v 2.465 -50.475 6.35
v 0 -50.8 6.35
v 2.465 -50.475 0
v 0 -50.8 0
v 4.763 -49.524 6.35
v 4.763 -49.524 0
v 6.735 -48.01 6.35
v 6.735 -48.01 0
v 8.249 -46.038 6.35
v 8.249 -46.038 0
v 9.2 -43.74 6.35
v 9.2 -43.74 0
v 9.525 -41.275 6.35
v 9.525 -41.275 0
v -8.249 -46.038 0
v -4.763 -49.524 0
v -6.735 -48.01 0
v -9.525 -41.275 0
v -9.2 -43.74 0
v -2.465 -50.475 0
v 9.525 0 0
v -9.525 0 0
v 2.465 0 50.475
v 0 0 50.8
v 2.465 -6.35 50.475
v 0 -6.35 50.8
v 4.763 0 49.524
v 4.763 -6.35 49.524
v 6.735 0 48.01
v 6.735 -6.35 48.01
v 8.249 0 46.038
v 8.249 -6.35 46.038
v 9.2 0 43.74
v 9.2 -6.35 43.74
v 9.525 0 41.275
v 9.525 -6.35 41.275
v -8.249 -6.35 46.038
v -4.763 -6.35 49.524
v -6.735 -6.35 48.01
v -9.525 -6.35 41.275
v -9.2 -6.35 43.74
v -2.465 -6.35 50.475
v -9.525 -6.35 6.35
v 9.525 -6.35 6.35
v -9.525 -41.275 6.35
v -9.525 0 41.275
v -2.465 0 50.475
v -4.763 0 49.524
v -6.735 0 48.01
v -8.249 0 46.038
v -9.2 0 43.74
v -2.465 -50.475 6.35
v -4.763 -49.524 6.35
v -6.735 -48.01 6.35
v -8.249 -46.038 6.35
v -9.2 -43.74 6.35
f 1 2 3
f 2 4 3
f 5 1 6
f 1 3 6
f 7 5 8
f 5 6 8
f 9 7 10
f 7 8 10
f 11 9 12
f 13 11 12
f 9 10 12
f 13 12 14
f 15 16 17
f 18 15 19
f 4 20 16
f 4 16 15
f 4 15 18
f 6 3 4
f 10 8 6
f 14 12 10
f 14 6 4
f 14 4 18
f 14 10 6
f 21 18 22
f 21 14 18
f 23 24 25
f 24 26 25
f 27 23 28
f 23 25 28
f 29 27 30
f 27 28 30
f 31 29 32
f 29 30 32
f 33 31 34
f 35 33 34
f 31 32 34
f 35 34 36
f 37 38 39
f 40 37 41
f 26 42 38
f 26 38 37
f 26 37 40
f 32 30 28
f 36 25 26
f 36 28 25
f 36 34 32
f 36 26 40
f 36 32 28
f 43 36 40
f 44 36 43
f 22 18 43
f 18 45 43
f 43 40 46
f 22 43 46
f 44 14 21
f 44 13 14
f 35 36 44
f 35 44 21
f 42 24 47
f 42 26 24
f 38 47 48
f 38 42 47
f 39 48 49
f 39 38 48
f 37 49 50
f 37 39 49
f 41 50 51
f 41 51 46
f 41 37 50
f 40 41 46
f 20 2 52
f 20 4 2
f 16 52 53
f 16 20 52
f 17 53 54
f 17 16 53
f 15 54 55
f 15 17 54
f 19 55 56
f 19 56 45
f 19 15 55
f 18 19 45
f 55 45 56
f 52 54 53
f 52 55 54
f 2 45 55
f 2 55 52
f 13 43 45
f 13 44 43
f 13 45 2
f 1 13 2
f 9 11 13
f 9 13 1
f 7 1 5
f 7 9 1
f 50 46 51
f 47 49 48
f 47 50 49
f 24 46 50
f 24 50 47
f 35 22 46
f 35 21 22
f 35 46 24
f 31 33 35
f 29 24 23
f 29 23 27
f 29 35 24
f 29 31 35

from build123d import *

# Parameters (mm, degrees)
F1_DEPTH = 9.525
F2_R     = 9.52499


# Not quite as in the source:
# - a fillet or chamfer is up to 0.001 mm smaller than in the source, because OpenCascade refuses the exact size


with BuildPart() as f1:
    # F0 (on Right) → F1 (new body, symmetric)
    with BuildSketch(Plane.YZ):
        Polygon((-50.8, 6.35), (-50.8, 0), (0, 0), (0, 50.8), (-6.35, 50.8), (-6.35, 6.35), align=None)
    extrude(amount=F1_DEPTH, both=True)

    # F2 (radius 9.525 in the source; OpenCascade refuses exactly that, so slightly less here)
    f2_edges = [f1.edges().sort_by_distance(p)[0] for p in [
        (9.525, -3.175, 50.8),
        (-9.525, -3.175, 50.8),
        (9.525, -50.8, 3.175),
        (-9.525, -50.8, 3.175),
    ]]
    fillet(f2_edges, radius=F2_R)


solid = f1.part
